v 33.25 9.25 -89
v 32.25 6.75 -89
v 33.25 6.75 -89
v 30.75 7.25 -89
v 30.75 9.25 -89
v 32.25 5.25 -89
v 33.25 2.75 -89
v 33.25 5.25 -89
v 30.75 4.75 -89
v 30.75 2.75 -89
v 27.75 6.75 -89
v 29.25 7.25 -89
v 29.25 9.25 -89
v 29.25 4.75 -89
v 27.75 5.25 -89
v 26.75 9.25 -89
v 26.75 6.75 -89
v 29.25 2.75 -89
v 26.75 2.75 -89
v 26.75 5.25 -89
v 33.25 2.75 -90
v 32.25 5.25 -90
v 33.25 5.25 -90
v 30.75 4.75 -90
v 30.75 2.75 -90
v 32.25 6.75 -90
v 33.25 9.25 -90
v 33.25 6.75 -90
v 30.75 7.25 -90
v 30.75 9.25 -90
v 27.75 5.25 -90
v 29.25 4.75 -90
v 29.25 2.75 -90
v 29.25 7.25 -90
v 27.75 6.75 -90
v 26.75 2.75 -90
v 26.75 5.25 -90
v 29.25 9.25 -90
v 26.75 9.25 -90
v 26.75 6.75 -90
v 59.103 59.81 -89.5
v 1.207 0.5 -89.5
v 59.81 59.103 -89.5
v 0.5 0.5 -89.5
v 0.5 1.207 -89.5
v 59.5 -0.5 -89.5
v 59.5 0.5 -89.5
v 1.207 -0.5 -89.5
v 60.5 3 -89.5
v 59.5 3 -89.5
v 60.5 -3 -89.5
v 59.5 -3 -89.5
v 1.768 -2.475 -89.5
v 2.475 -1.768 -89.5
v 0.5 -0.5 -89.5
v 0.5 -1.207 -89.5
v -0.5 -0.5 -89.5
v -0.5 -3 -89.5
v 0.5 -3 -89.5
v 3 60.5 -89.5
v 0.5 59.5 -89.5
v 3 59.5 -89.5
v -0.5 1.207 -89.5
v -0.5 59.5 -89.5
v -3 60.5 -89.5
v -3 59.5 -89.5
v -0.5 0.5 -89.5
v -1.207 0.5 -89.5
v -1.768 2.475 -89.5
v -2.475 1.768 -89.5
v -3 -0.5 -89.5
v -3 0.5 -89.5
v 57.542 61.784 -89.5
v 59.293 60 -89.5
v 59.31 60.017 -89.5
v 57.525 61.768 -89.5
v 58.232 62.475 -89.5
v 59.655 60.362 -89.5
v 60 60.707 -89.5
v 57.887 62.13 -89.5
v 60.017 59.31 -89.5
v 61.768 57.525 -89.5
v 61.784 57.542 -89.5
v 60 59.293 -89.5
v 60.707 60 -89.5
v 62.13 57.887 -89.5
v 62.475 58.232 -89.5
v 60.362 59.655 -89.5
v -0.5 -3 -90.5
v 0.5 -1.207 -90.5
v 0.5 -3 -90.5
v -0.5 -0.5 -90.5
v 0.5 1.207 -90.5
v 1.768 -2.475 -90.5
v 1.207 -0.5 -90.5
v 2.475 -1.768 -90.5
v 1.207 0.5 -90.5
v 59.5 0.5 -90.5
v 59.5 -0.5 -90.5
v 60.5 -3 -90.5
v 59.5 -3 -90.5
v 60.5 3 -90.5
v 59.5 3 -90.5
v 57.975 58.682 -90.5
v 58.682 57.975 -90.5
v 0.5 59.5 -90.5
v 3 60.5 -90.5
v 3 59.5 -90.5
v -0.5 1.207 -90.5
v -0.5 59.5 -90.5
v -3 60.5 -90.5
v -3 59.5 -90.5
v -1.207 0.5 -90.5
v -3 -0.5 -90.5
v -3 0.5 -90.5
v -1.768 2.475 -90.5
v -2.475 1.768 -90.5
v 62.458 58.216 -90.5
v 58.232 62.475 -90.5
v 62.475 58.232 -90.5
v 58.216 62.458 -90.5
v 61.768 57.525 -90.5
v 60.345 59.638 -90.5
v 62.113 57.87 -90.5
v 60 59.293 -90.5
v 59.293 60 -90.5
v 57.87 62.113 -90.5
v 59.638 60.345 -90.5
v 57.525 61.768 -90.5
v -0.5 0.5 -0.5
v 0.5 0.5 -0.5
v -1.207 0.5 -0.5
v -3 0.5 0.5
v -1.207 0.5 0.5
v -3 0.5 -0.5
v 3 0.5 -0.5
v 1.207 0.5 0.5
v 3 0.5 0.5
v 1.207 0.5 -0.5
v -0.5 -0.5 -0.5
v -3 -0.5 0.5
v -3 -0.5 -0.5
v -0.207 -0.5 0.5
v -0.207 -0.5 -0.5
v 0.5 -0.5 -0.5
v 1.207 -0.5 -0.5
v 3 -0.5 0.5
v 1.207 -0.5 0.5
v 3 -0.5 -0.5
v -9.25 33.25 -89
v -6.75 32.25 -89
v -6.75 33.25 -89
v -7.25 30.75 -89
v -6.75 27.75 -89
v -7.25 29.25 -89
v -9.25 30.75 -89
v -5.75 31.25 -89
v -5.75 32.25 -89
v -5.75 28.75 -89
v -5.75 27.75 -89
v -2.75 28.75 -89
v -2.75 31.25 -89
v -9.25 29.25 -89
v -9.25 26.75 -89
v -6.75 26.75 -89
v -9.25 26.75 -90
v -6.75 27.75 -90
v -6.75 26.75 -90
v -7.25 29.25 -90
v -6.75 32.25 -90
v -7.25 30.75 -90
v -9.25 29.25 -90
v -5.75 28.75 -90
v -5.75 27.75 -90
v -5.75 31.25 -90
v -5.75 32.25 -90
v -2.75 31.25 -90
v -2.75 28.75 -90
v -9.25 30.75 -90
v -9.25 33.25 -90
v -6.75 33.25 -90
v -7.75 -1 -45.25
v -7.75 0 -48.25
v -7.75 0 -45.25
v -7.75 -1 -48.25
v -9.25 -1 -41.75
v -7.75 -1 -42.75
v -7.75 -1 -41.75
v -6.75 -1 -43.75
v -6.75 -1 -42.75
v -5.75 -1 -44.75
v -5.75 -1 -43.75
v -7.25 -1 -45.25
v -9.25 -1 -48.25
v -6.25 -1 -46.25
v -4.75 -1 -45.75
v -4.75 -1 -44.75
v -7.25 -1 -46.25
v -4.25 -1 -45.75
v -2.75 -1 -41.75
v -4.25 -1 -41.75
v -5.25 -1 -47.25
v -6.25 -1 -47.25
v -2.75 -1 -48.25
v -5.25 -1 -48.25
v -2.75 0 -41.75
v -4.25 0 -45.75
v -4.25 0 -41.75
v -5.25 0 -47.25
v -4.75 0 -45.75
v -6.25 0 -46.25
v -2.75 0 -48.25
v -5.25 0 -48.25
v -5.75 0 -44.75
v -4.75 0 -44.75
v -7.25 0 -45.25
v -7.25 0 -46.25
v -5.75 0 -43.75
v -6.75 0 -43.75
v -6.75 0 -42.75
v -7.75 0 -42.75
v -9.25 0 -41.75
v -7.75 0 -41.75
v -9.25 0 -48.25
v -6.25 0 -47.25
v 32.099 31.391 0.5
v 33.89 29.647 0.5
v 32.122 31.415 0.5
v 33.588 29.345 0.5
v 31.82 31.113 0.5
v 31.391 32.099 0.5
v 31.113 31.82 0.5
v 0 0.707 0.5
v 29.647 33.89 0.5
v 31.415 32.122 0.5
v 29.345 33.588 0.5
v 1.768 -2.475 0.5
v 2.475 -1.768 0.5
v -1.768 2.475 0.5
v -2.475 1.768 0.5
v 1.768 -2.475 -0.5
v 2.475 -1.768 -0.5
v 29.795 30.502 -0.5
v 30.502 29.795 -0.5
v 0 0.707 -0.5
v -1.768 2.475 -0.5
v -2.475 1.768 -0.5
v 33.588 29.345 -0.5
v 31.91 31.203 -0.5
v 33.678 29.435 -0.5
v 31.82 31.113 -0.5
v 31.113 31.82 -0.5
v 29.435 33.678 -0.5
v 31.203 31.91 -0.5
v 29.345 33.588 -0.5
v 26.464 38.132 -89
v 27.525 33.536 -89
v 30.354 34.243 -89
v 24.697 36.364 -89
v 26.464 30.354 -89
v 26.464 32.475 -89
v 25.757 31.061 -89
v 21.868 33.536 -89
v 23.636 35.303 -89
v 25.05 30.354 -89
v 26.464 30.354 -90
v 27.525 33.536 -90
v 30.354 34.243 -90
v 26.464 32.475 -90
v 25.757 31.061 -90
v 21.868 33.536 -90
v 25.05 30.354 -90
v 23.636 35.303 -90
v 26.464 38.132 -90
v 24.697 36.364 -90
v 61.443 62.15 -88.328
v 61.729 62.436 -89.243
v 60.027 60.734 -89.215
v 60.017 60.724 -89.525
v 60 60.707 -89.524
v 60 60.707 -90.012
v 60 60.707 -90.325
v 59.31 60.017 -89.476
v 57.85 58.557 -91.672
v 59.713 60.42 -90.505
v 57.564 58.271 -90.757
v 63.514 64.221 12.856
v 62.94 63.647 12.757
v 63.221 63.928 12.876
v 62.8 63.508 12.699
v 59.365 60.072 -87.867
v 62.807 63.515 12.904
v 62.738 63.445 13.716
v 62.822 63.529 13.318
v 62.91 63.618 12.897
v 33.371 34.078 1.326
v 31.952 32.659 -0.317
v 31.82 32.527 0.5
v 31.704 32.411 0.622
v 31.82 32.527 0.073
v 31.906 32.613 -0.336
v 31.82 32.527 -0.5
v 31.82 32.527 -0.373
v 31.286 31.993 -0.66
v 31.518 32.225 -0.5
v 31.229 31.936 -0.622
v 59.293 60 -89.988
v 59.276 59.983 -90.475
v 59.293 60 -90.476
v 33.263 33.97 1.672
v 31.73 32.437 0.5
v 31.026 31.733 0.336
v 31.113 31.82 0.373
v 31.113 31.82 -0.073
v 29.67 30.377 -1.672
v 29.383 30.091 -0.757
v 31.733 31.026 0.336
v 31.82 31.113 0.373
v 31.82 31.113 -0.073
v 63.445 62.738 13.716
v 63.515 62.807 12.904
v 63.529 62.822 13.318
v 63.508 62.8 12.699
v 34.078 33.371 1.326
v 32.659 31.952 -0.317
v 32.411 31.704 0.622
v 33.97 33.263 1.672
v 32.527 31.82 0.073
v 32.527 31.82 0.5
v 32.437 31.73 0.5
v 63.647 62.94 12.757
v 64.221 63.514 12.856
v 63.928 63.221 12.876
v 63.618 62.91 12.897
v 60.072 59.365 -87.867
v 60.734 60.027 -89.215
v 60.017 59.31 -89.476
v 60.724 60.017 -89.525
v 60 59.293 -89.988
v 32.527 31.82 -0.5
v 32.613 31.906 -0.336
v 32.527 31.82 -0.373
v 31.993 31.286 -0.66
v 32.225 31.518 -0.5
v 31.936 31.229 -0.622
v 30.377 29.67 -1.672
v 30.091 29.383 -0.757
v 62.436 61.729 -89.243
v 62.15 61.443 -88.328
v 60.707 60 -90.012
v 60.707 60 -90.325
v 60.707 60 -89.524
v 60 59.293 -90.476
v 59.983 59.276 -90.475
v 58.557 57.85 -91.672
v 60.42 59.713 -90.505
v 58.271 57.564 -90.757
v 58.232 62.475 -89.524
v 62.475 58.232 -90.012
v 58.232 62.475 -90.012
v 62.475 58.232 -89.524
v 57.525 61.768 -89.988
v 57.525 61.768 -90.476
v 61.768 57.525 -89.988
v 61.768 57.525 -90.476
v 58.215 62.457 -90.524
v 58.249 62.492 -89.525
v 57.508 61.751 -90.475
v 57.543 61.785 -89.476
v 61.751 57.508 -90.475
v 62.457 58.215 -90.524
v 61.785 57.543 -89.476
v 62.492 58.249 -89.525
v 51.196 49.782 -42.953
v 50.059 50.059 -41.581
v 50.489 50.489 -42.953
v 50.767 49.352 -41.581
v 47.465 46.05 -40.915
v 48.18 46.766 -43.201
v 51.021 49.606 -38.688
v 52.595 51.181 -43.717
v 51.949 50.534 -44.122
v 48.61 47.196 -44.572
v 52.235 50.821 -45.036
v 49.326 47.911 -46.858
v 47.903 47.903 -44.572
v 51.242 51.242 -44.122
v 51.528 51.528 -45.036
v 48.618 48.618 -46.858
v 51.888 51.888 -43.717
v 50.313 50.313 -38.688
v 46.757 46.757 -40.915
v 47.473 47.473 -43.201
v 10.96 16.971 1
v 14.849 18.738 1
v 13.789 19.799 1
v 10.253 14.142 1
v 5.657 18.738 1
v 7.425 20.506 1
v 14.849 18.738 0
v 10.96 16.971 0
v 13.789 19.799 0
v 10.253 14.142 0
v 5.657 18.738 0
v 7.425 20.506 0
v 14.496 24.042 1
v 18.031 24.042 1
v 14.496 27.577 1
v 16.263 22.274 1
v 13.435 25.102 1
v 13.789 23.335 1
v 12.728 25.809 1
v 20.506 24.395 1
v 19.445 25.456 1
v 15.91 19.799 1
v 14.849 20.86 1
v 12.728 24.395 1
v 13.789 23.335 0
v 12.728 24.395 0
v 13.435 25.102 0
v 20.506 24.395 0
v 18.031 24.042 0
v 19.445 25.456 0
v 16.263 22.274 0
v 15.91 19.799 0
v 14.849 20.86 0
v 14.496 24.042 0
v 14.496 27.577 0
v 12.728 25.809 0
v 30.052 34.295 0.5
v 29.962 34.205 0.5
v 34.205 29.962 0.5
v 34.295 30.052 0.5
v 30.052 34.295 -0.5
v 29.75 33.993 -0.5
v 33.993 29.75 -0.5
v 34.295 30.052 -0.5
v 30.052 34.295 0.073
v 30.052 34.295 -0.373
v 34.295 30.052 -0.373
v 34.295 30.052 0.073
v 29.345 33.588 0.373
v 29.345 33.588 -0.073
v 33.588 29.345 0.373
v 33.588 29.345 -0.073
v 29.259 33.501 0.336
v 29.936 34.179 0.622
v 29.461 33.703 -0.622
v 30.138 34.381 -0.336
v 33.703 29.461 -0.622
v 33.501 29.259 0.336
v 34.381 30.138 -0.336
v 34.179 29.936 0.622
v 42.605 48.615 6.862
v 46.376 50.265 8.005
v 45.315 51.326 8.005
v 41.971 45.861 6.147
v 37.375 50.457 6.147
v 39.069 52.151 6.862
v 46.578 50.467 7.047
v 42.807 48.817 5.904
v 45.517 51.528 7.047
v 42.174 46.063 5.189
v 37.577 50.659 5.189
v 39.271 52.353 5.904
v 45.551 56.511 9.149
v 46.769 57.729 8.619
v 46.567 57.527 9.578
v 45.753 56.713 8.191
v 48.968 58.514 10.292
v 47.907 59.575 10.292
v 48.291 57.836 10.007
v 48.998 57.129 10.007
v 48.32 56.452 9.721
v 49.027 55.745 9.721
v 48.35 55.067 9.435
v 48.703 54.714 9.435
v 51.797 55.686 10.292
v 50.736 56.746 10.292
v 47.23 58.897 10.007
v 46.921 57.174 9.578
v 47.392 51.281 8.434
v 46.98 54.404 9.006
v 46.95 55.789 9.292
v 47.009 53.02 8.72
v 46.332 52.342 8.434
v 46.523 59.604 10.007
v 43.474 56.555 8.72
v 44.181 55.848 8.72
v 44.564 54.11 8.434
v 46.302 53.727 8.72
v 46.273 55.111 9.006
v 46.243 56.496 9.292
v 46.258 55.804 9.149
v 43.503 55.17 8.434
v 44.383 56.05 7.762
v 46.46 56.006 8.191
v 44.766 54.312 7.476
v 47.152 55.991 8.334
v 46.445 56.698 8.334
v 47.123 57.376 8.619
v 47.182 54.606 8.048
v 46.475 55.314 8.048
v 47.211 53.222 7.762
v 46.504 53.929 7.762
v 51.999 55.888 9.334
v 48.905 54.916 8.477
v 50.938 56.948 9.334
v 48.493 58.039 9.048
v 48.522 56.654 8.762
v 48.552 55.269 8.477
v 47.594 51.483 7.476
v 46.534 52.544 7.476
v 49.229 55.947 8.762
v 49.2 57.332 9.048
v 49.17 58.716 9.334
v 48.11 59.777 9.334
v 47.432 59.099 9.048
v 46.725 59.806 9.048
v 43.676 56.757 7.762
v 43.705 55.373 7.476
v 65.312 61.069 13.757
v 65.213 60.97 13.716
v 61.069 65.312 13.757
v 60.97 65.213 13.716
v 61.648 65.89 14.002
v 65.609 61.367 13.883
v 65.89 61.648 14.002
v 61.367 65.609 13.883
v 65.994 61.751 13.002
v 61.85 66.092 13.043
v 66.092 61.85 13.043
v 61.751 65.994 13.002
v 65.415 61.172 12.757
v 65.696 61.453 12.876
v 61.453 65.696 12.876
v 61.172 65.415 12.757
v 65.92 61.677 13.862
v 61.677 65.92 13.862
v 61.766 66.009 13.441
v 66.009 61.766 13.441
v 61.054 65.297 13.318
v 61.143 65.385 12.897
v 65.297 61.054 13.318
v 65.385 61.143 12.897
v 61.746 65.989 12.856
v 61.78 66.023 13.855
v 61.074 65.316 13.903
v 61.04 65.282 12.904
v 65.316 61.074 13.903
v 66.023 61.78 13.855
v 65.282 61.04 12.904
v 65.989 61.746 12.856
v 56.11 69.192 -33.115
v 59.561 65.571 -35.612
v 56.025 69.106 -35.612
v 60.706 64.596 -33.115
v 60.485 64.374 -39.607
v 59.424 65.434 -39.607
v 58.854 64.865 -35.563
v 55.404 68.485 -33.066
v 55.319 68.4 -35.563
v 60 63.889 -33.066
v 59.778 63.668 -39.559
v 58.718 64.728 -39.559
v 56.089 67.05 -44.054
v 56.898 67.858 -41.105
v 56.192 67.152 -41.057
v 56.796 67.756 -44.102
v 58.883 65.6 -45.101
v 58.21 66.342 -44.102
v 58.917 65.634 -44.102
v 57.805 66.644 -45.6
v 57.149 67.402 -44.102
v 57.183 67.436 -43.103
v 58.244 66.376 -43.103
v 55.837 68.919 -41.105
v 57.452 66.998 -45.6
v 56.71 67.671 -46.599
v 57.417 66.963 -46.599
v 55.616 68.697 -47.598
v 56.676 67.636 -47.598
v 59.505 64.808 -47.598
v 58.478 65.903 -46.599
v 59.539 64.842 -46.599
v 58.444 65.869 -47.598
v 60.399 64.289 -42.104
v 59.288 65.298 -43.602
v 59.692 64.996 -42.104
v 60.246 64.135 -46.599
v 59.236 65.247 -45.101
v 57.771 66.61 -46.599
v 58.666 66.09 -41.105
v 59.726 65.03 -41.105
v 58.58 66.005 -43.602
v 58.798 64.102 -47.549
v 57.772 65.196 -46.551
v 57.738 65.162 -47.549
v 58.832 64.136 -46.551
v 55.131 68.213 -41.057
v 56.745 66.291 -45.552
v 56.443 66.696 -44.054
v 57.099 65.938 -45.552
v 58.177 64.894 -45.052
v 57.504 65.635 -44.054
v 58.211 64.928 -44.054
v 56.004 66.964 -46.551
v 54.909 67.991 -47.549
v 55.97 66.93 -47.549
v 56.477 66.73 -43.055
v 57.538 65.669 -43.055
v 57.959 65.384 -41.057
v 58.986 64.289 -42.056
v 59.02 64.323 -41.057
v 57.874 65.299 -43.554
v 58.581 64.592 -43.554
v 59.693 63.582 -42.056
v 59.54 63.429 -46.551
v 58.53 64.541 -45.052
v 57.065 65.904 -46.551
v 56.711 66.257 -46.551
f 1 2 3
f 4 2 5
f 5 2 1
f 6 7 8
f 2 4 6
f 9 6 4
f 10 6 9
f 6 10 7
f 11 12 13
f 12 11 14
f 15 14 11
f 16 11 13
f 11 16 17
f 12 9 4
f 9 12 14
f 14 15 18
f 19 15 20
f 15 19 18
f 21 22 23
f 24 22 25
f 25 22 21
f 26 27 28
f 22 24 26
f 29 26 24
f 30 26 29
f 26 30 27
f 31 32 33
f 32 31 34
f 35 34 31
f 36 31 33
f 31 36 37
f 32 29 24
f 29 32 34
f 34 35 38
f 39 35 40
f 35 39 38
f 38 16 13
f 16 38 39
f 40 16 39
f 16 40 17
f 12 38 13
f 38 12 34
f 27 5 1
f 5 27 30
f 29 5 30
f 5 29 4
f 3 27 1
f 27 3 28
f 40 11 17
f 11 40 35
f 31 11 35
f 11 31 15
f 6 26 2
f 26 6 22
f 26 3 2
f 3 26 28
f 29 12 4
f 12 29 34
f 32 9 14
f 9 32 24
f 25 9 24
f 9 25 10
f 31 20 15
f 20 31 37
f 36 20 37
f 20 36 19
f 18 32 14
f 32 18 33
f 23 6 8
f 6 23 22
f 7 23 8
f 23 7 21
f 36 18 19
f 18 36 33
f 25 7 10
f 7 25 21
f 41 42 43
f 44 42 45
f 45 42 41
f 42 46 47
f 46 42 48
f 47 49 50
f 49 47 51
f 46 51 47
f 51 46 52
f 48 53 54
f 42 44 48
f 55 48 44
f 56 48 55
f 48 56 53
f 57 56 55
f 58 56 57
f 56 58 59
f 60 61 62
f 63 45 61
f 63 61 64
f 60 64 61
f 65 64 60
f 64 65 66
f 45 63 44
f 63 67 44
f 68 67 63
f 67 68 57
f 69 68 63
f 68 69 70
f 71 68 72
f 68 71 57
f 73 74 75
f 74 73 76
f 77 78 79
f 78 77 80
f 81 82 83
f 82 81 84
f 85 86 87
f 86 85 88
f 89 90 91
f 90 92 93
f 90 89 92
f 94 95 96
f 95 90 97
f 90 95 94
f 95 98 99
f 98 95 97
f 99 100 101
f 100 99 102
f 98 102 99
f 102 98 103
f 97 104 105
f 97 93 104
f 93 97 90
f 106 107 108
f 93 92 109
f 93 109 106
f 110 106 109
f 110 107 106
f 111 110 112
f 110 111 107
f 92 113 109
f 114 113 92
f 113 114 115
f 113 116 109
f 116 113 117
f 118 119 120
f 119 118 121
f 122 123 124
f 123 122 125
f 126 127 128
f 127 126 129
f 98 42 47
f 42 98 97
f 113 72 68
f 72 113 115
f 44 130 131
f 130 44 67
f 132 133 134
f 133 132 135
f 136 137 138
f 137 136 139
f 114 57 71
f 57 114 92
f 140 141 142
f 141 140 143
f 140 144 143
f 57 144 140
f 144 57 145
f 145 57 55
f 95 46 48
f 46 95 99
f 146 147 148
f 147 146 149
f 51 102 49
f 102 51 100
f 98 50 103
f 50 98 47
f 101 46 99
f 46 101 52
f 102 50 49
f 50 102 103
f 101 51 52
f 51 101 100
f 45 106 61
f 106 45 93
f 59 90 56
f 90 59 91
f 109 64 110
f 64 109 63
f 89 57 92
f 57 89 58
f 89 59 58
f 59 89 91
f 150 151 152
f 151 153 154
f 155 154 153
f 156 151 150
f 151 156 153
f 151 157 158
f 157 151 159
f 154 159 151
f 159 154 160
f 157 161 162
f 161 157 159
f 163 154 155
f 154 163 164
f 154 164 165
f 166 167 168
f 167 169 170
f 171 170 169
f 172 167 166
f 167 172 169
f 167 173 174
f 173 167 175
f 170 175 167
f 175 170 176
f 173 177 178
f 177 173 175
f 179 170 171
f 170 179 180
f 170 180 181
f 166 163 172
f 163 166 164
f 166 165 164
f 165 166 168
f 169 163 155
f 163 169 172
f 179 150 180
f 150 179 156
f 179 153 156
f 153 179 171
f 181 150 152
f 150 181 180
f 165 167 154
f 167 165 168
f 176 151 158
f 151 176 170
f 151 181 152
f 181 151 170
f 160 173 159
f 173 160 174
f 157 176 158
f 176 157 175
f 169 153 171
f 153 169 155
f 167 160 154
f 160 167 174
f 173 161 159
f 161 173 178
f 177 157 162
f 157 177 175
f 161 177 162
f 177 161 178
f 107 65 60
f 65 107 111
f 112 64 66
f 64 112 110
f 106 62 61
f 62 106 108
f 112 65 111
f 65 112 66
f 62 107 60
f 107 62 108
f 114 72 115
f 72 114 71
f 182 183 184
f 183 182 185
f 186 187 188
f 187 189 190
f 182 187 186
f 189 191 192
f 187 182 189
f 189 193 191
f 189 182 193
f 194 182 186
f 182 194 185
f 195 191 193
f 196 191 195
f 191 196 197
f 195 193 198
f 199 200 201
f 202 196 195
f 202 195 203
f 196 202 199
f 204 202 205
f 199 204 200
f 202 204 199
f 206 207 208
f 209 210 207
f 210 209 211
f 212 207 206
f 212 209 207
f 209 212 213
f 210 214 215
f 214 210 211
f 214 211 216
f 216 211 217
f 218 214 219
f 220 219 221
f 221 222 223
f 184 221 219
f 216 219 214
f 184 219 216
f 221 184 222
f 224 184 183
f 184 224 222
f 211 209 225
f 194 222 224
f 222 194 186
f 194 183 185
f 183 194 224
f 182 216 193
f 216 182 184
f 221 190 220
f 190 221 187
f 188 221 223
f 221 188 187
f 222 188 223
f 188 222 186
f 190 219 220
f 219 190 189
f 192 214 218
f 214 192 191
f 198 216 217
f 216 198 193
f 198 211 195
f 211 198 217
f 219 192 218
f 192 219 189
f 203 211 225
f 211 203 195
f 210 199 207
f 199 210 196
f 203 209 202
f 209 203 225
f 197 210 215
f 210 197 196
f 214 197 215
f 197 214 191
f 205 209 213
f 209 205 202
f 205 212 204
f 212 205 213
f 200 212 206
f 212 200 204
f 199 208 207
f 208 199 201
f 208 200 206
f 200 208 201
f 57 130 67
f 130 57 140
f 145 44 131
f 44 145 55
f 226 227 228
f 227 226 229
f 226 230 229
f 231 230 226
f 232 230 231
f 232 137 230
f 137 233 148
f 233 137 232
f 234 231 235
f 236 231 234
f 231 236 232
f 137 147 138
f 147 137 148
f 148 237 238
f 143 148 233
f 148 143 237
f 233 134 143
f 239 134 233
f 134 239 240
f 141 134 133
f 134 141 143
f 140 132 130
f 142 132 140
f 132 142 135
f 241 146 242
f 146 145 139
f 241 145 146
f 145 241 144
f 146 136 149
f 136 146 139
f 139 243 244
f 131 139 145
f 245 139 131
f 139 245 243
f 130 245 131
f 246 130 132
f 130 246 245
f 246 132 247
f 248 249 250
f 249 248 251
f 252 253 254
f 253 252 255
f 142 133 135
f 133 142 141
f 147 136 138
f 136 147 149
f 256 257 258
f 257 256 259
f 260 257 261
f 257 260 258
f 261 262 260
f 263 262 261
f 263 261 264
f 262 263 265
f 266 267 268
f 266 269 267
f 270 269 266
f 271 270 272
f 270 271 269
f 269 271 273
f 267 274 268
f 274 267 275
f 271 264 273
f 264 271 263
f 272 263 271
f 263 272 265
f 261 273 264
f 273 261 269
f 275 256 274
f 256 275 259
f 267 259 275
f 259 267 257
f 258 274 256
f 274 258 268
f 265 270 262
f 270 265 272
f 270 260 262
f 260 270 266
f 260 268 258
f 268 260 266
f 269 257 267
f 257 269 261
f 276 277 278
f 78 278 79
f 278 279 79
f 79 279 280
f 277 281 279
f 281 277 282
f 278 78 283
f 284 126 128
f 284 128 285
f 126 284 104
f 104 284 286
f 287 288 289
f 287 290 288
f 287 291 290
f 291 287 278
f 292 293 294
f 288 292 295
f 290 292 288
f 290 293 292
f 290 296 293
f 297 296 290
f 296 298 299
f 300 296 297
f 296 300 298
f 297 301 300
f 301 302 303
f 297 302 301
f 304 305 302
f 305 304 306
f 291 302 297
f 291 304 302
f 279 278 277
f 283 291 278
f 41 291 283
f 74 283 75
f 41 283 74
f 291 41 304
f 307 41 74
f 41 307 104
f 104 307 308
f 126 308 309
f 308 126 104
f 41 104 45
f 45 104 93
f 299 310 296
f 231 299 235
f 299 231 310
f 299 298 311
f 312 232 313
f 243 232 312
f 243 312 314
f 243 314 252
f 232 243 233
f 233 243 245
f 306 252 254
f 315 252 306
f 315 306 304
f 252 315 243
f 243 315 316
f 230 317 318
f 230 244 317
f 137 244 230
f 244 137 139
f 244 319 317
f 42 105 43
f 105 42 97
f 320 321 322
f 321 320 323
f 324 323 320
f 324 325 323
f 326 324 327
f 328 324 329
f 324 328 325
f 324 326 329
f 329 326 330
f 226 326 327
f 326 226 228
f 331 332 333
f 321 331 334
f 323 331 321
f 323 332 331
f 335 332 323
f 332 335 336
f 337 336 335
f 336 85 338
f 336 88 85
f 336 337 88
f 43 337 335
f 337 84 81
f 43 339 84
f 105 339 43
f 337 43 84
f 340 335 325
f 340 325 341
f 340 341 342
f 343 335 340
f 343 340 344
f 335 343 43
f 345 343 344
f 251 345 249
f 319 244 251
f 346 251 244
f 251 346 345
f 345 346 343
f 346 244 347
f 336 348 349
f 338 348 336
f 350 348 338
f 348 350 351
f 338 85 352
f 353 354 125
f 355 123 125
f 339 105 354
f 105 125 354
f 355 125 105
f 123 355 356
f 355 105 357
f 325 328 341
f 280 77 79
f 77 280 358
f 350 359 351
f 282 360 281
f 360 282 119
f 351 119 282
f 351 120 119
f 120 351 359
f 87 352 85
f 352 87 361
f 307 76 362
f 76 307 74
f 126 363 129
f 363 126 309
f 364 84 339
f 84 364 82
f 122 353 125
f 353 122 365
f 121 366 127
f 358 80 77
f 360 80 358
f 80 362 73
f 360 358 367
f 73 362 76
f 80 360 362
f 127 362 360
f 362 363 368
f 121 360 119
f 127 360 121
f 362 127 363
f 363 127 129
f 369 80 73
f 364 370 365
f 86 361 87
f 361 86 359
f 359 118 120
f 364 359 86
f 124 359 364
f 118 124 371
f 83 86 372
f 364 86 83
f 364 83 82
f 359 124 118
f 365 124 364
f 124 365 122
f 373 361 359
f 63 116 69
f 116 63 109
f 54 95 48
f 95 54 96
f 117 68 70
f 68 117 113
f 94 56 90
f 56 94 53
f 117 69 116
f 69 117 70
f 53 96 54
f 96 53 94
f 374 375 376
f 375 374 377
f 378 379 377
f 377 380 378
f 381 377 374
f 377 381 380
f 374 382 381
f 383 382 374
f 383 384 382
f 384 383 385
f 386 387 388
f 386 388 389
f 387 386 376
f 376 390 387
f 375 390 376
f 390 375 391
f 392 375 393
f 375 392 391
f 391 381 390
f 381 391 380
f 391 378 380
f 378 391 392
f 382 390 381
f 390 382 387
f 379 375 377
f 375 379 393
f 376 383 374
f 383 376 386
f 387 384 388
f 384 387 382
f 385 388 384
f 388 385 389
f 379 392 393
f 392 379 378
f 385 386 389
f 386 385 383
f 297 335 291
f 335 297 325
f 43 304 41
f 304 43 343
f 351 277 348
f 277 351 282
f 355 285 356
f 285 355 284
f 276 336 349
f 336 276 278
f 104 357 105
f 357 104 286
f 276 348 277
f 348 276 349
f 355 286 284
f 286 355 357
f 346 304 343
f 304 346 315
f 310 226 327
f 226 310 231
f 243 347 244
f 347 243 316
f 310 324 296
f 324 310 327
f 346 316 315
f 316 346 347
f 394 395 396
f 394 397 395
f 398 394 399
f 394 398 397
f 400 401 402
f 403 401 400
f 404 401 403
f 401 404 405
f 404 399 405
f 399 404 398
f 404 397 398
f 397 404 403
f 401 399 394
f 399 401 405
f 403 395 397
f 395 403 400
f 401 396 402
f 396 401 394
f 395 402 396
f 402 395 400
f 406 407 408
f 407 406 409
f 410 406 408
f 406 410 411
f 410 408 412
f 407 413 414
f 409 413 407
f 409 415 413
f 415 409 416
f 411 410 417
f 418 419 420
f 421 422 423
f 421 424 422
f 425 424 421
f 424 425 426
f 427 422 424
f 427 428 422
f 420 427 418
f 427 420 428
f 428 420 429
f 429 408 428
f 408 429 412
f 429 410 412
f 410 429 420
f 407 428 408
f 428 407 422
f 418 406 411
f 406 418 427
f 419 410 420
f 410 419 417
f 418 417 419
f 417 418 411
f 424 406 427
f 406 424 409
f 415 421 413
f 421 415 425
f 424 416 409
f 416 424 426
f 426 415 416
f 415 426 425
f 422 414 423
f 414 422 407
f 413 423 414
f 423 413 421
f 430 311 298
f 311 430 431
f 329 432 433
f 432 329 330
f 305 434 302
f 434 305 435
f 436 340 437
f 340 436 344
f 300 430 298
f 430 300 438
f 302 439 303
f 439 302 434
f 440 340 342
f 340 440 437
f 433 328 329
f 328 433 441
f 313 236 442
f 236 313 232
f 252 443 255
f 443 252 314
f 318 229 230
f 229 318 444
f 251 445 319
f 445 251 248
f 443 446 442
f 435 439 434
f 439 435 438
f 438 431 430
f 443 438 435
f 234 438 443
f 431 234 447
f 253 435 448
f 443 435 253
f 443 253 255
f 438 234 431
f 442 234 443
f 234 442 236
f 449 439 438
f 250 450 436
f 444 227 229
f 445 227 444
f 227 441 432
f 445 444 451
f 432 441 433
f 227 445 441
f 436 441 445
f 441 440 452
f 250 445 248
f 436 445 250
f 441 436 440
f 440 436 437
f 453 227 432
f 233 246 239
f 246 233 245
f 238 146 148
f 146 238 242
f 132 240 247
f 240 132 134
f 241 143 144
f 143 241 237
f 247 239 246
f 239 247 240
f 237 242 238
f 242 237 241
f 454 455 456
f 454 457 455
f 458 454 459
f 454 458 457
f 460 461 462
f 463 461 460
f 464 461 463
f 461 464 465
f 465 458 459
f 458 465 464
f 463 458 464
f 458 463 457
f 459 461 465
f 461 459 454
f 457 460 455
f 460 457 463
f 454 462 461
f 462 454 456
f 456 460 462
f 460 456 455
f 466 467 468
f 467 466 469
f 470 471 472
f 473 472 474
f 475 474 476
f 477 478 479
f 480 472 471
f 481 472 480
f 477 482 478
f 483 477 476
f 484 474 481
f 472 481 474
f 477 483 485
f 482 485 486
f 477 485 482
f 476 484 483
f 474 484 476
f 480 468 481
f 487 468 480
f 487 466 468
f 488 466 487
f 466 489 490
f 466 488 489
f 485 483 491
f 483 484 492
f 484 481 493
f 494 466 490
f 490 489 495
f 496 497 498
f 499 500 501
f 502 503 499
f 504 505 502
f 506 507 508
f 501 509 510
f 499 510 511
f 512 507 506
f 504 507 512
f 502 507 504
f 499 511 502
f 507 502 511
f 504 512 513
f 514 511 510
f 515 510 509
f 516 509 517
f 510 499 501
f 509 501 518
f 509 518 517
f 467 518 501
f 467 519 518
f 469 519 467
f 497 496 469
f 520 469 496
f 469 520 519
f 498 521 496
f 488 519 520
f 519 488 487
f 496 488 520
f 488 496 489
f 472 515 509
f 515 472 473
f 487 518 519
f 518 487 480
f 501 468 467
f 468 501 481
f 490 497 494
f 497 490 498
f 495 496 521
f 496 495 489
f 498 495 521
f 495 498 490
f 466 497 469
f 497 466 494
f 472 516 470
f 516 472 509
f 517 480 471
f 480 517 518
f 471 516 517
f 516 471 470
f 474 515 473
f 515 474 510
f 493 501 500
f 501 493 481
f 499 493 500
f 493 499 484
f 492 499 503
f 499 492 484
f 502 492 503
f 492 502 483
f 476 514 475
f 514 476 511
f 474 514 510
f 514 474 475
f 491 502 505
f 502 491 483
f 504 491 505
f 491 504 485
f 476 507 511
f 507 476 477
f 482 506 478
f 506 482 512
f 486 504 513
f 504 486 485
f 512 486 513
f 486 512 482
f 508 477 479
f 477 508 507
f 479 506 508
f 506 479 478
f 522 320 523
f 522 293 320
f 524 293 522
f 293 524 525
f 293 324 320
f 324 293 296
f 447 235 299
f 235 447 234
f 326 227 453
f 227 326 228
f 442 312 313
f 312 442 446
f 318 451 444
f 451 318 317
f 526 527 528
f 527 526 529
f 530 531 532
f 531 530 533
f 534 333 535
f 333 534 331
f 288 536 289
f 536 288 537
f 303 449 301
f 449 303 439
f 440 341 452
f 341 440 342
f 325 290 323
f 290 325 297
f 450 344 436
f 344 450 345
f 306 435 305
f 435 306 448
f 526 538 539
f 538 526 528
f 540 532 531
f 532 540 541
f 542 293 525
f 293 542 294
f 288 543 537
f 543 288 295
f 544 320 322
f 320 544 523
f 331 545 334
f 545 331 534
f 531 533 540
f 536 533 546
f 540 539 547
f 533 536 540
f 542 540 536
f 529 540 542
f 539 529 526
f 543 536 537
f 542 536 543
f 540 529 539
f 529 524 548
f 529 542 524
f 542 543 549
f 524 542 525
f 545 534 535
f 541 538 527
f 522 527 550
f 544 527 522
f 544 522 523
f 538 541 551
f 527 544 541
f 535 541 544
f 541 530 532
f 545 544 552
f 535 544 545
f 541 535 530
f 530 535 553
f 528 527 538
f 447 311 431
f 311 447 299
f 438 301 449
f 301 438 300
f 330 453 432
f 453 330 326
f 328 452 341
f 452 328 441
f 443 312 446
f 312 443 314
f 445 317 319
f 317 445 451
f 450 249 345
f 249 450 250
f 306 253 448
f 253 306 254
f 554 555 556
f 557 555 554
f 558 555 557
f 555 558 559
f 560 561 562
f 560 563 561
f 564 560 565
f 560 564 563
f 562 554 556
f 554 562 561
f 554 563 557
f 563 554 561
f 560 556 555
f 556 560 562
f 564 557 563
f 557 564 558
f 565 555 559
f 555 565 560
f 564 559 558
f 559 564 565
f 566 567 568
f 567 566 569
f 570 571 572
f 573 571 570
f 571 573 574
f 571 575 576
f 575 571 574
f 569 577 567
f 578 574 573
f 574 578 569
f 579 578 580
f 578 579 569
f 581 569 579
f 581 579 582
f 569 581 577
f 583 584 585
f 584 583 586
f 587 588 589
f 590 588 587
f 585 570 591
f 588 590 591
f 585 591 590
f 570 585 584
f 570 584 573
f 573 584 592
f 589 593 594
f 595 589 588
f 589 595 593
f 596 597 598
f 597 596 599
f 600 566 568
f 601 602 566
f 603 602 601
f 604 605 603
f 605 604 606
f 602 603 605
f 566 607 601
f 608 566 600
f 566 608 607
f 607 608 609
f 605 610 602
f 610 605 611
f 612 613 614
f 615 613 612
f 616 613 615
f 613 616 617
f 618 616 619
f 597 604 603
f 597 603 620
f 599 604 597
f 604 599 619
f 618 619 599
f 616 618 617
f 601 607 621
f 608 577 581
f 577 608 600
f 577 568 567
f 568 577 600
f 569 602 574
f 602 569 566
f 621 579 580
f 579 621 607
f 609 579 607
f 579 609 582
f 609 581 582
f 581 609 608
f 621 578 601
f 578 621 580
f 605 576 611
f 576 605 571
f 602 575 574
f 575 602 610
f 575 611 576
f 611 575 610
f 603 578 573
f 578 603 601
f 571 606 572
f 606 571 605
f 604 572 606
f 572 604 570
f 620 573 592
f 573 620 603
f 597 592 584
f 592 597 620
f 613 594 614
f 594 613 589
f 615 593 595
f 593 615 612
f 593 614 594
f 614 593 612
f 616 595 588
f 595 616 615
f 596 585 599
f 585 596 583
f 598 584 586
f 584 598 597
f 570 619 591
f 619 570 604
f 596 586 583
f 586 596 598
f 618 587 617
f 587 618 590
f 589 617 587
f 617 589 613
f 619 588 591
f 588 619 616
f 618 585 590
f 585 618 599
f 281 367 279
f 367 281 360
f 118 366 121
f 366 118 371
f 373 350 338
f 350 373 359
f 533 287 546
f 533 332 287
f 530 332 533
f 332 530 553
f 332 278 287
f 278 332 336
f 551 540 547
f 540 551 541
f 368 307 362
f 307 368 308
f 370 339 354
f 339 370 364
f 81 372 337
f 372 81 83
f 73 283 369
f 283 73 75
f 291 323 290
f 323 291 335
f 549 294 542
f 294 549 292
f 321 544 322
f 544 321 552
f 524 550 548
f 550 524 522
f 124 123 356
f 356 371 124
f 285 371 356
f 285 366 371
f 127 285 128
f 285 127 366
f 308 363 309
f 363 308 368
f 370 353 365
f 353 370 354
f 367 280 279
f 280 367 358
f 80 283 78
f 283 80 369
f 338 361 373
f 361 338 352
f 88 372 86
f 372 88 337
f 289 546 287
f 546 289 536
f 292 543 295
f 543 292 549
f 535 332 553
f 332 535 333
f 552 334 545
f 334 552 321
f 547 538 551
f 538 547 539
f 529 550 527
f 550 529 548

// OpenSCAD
// file: for_diagrams.scad
include<bitmap.scad>;

scale=1;
res=50;

module d_vector(length, label){
	union(){
		cube([length,scale,1],center=true);
		translate([length/2,0,0]){
			rotate([0,0,45])cube([scale,scale,1],center=true);
			rotate([0,0,45])translate([-scale*3/2,0,0])cube([scale*3,scale,1],center=true);
			rotate([0,0,-45])translate([-scale*3/2,0,0])cube([scale*3,scale,1],center=true);
		}
		translate([-length/2,0,0]){
			cylinder(r=scale,h=1,center=true,$fn=res);
		}
		rotate([0,0,-90])
			translate([-scale*2-scale,-scale*2,0])
				8bit_str(["v",label], 2, scale, 1);
	}
}

module d_length_t1(length, label1){
	union(){
		cube([length,scale,1],center=true);
		translate([length/2,0,0]){
			cube([scale,scale*6,1],center=true);
		}
		translate([-length/2,0,0]){
			cube([scale,scale*6,1],center=true);
		}
		rotate([0,0,-90])
			translate([-scale*6,0,0])
				8bit_str([label1], 1, scale, 1);
	}
}

module d_length_t2(length, label1, label2){
	union(){
		cube([length,scale,1],center=true);
		translate([length/2,0,0]){
			cube([scale,scale*6,1],center=true);
		}
		translate([-length/2,0,0]){
			cube([scale,scale*6,1],center=true);
		}
		rotate([0,0,-90])
			translate([-scale*6,-scale*2,0])
				8bit_str([label1, label2], 2, scale, 1);
	}
}

//todo: Can only do 0-180 degrees. Extend to 360.
module d_angle(a,r,dir,label){
	union(){
		difference(){
			cylinder(r=r+scale/2,h=1,center=true,$fn=res);
			cylinder(r=r-scale/2,h=2,center=true,$fn=res);
			translate([0,-((r+scale/2)+1)/2,0])cube([(r+scale/2)*2+1, (r+scale/2)+1, 2],center=true);
			rotate([0,0,a])translate([0,((r+scale/2)+1)/2,0])
				cube([(r+scale/2)*2+1, (r+scale/2)+1, 2],center=true);
			if(dir==1){
				translate([(r)*cos(a),(r)*sin(a),0])rotate([0,0,a+90])
					translate([-scale/2+0.1,0,0])cube([scale,scale+1,2],center=true);
			}
			else{
				translate([r,0,0])
					translate([0,scale/2+0.1,0])cube([scale+1,scale+1,2],center=true);
			}
		}
		if(dir==1){
			translate([r,0,0])cylinder(r=scale*1.5,h=1,center=true,$fn=res);
			translate([(r)*cos(a),(r)*sin(a),0])rotate([0,0,a+90]){
				rotate([0,0,45])translate([-scale/2,scale/2,0])cube([scale,scale,1],center=true);
				rotate([0,0,45])translate([-scale*6/2,scale/2,0])cube([scale*6,scale,1],center=true);
				rotate([0,0,-45])translate([-scale*6/2,-scale/2,0])cube([scale*6,scale,1],center=true);
			}
		}
		else{
			translate([(r)*cos(a),(r)*sin(a),0])cylinder(r=scale*1.5,h=1,center=true,$fn=res);
			translate([r,0,0])rotate([0,0,-90]){
				rotate([0,0,45])translate([-scale/2,scale/2,0])cube([scale,scale,1],center=true);
				rotate([0,0,45])translate([-scale*6/2,scale/2,0])cube([scale*6,scale,1],center=true);
				rotate([0,0,-45])translate([-scale*6/2,-scale/2,0])cube([scale*6,scale,1],center=true);
			}
		}
		rotate([0,0,a/2-180])
			translate([-scale*8-r,-scale*2,0])
				8bit_str(["a",label], 2, scale, 1);
		translate([r/2,0,0])cube([r,1,1],center=true);
		rotate([0,0,a])translate([r/2,0,0])cube([r,1,1],center=true);
	}
}
// file: parameters.scad
/**
 * Robot Parameters File
 */

SHOW_LABEL = true;

center_offset = 33;   // distance from the center of robot and the first servo axis
L1 = 45;              // distance from the first servo axis and the second servo axis
L2 = 46.8;            // distance from the second servo axis and the third servo axis
L3 = 103.5;           // distance from the third servo axis and the tip of the leg
// file: colors.scad
/**
 * Color Resource File
 */

red = [1,0,0];
cyan = [0,1,1];
blue = [0,0,1];
blue_dark = [0,0,160/255];
blue_light = [173/255,216/255,230/255];
purple = [128/255,0,128/255];
yellow = [1,1,0];
lime = [0,1,0];
magenta = [1,0,1];
white = [1,1,1];
silver = [192/255,192/255,192/255];
grey = [128/255,128/255,128/255];
black = [0,0,0];
orange = [1,128/255,64/255];
brown = [165/255,42/255,42/255];
maroon = [128/255,0,0];
green = [0,128/255,0];
olive = [128/255,128/255,0];
// main file
include<colors.scad>;
include<parameters.scad>;
include<for_diagrams.scad>;



x = 60+60*$t;
y = 60-30*$t;
z = 90+20*$t;

u = sqrt(x*x + y*y);
n = sqrt((u-L1)*(u-L1) + z*z);
a1 = acos((z*z+n*n-(u-L1)*(u-L1)) / (2*z*n));
a2 = acos((n*n+L2*L2-L3*L3) / (2*n*L2));
a3 = acos((L2*L2+L3*L3-n*n) / (2*L2*L3));

alpha = atan(y/x);
beta = a1 + a2 - 90;
gamma = 180 - a3;

echo("alpha: ", alpha);
echo("beta: ", beta);
echo("gamma: ", gamma);

distance_x(red);
distance_y(green);
distance_z(blue);
distance_u();
distance_n(grey);
single_leg([alpha,-beta,gamma], brown, purple, orange);



module single_leg(angles, color1, color2, color3) {
    rotate([0,0,angles[0]]) {
        leg_part(L1, color1, "L", "1");                      // leg part 1
        translate([L1,0,0]) rotate([0,angles[1],0]) {
            leg_part(L2, color2, "L", "2");                  // leg part 2
            translate([L2,0,0]) rotate([0,angles[2],0]) {
                leg_part(L3, color3, "L", "3");              // leg part 3
            }
        }
    }
}

module leg_part(length, color, label1, label2) {
    translate([length/2, 0, 0]) color(color) 
    if (SHOW_LABEL) 
        d_length_t2(length, label1, label2); 
    else 
        cube([length, 1, 1], true);
}

module distance_x(color) {
    translate([(x)/2,0,-z]) rotate([0,0,0]) color(color)
    d_length_t1(x,"X");
}
module distance_y(color) {
    translate([0,y/2,-z]) rotate([0,0,90]) color(color)
    d_length_t1(y,"Y");
}
module distance_z(color){
    translate([0,0,-z/2]) rotate([0,-90,90]) color(color)
    d_length_t1(z,"Z");
}
module distance_u(color){
    rotate([0,0,alpha]) translate([(u)/2,0,-z]) color(color)
    d_length_t1(u,"u");
}
module distance_n(color){
    rotate([0,0,alpha]) translate([L1,0,0]) rotate([0,90-a1,0]) translate([n/2,0,0]) rotate([90,0,0]) color(color)
    d_length_t1(n,"n");
}
